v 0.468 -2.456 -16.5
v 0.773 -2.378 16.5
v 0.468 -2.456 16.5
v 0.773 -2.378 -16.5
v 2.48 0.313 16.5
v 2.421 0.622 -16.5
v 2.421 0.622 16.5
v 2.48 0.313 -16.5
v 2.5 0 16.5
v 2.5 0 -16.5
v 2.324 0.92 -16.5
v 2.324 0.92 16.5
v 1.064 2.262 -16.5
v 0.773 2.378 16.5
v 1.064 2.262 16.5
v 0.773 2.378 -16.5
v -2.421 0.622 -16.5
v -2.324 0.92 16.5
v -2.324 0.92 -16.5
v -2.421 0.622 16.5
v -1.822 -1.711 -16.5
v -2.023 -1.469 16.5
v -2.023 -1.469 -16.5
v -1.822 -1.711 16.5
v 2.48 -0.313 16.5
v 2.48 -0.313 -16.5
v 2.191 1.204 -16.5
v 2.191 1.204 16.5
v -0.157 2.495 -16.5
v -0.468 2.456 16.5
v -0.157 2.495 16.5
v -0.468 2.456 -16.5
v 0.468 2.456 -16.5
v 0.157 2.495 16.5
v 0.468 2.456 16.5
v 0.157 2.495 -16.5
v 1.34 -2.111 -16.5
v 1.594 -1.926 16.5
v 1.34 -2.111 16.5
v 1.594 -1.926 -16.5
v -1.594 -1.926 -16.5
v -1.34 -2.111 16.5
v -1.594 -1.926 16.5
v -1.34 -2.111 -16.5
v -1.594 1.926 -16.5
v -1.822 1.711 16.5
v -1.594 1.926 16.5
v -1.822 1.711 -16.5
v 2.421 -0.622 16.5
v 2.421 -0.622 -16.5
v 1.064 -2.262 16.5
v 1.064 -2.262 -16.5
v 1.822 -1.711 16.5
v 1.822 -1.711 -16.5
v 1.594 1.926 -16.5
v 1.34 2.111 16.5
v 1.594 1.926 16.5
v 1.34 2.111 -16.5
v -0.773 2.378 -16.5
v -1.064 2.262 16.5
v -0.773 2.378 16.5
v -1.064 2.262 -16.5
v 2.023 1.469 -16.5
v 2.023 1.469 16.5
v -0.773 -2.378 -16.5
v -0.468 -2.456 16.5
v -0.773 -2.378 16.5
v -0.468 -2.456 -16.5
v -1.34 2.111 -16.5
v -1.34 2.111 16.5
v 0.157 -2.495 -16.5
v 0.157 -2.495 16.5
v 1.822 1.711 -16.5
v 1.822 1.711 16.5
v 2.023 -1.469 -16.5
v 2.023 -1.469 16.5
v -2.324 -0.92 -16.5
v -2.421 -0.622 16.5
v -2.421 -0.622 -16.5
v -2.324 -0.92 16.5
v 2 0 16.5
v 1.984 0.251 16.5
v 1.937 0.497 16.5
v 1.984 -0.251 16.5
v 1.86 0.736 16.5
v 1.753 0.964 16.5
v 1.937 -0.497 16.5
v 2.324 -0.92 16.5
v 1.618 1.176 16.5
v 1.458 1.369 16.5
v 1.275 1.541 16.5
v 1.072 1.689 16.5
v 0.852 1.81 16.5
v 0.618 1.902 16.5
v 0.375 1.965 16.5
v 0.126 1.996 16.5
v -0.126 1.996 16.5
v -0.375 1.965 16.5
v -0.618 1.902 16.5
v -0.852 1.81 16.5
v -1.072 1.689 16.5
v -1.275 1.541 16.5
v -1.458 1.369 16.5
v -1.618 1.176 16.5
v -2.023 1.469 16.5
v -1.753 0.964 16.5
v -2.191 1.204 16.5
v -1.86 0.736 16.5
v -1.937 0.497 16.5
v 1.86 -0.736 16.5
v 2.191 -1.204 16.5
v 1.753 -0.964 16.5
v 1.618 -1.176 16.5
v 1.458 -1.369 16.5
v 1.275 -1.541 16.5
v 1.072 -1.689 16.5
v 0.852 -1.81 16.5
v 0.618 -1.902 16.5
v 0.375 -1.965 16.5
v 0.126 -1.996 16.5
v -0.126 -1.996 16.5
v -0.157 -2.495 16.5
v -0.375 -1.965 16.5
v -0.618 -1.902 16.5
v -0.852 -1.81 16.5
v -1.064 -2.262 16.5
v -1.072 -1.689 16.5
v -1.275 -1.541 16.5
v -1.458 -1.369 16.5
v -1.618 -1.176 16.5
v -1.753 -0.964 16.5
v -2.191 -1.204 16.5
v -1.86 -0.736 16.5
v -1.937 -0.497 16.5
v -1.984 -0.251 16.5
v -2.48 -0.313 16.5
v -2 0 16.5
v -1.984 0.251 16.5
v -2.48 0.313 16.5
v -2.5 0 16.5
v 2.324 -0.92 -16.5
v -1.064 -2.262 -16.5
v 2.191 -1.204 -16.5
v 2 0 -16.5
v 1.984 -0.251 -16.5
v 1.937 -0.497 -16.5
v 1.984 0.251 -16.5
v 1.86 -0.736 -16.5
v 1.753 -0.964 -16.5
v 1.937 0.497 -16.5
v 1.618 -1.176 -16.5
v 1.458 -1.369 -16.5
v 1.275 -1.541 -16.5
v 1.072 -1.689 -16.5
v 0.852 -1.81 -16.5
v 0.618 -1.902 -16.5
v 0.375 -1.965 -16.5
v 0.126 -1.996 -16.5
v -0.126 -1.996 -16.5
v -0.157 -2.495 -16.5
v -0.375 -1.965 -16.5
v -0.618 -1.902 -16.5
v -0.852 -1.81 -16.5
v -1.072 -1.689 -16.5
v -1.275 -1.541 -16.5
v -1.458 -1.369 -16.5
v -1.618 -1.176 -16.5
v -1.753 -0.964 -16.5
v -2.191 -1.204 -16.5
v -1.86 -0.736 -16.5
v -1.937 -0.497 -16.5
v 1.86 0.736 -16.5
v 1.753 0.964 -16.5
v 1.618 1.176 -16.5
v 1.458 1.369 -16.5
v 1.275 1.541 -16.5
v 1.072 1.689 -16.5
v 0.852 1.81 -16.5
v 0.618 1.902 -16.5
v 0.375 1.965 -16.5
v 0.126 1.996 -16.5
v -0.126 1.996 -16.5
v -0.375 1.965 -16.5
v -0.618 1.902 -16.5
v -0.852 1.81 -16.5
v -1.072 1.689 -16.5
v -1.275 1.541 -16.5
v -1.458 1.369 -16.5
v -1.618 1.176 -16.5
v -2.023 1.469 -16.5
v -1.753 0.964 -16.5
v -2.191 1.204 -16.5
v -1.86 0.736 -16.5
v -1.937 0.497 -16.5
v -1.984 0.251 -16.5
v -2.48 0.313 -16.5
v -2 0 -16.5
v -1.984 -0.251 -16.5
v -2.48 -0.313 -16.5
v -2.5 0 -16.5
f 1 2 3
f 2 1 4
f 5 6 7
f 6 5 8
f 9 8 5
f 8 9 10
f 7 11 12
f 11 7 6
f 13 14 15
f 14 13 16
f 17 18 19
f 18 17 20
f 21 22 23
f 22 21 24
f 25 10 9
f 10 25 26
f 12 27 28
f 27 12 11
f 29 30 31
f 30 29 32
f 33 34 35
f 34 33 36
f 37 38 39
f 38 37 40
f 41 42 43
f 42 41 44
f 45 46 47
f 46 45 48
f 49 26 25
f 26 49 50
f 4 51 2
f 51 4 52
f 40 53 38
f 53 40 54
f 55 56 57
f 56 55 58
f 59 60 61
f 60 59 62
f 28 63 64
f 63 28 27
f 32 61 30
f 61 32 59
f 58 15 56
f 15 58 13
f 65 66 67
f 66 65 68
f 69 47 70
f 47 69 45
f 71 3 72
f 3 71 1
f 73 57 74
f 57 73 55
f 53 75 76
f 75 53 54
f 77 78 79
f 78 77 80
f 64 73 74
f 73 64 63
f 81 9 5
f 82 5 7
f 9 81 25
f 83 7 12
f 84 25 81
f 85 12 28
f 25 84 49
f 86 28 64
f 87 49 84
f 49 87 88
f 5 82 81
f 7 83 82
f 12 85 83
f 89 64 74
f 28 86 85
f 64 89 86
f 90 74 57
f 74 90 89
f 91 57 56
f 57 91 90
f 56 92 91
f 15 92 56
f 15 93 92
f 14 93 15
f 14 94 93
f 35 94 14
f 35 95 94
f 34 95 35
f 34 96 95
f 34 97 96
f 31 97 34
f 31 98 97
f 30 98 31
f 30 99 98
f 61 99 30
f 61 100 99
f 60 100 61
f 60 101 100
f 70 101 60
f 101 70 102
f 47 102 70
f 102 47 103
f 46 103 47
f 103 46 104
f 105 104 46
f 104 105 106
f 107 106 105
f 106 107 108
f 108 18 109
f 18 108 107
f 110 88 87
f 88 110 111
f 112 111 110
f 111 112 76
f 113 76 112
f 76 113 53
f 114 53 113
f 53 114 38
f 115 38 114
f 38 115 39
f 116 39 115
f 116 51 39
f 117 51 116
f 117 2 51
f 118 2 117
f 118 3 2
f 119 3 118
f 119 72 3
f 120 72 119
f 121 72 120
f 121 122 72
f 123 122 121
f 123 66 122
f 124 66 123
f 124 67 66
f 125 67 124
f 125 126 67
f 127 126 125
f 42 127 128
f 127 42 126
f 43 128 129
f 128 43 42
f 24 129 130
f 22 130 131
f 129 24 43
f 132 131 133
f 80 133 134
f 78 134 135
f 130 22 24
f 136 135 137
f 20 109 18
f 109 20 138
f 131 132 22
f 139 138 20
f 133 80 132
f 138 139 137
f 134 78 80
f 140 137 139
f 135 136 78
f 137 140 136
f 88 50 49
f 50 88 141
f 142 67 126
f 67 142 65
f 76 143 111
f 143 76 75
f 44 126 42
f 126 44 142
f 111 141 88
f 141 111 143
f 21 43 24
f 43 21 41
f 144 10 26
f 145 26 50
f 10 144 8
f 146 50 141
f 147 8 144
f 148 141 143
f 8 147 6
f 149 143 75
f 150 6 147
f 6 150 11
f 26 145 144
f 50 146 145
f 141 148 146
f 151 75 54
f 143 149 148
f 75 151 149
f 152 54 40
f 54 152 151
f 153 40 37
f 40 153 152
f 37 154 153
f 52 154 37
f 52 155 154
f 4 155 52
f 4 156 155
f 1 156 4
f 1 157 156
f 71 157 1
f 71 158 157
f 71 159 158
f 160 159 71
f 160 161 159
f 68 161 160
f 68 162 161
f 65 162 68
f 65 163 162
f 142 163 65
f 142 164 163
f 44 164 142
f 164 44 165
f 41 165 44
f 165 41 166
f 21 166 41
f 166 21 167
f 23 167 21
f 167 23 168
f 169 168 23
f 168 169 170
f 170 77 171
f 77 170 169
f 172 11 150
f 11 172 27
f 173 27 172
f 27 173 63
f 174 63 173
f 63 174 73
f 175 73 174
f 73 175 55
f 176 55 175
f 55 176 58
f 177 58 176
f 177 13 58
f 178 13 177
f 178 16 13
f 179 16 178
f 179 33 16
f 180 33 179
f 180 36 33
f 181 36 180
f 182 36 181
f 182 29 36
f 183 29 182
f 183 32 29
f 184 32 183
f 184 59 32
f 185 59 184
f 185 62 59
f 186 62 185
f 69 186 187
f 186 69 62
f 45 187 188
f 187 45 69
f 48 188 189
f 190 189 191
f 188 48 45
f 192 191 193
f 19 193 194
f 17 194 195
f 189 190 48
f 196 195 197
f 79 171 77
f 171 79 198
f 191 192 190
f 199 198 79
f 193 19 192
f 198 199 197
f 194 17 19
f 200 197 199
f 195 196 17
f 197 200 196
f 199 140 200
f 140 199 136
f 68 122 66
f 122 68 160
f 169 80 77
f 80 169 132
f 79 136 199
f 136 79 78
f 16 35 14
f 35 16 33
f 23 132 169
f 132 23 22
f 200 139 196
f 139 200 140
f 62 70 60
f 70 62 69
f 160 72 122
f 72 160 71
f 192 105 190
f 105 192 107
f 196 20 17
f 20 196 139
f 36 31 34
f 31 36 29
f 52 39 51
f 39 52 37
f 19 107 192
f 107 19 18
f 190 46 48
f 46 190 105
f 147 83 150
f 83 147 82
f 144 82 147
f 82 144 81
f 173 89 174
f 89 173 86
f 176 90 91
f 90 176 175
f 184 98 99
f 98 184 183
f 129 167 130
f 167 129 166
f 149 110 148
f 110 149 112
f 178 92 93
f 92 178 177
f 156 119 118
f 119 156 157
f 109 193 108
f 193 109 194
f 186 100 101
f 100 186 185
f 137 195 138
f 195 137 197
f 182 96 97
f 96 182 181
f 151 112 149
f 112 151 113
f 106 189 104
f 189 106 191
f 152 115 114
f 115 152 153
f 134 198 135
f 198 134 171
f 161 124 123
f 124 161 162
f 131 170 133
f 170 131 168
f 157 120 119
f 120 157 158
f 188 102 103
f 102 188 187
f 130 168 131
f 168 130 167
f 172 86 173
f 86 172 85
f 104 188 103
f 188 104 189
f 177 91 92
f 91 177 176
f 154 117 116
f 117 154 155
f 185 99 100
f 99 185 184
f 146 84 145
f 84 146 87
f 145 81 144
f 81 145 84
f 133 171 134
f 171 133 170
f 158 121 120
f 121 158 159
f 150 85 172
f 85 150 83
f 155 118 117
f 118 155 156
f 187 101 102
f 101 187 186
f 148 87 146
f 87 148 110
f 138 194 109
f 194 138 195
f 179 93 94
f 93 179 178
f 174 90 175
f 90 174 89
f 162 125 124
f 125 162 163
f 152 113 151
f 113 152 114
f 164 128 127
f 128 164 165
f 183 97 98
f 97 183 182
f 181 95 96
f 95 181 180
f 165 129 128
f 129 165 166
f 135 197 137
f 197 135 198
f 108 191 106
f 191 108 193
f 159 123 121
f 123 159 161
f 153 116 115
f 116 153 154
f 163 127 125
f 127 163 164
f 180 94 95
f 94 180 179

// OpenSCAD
$fn = 50;


difference() {
	union() {
		translate(v = [0, 0, -16.5000000000]) {
			cylinder(h = 33, r = 2.5000000000);
		}
	}
	union() {
		translate(v = [0, 0, -100.0000000000]) {
			cylinder(h = 200, r = 2.0000000000);
		}
	}
}
